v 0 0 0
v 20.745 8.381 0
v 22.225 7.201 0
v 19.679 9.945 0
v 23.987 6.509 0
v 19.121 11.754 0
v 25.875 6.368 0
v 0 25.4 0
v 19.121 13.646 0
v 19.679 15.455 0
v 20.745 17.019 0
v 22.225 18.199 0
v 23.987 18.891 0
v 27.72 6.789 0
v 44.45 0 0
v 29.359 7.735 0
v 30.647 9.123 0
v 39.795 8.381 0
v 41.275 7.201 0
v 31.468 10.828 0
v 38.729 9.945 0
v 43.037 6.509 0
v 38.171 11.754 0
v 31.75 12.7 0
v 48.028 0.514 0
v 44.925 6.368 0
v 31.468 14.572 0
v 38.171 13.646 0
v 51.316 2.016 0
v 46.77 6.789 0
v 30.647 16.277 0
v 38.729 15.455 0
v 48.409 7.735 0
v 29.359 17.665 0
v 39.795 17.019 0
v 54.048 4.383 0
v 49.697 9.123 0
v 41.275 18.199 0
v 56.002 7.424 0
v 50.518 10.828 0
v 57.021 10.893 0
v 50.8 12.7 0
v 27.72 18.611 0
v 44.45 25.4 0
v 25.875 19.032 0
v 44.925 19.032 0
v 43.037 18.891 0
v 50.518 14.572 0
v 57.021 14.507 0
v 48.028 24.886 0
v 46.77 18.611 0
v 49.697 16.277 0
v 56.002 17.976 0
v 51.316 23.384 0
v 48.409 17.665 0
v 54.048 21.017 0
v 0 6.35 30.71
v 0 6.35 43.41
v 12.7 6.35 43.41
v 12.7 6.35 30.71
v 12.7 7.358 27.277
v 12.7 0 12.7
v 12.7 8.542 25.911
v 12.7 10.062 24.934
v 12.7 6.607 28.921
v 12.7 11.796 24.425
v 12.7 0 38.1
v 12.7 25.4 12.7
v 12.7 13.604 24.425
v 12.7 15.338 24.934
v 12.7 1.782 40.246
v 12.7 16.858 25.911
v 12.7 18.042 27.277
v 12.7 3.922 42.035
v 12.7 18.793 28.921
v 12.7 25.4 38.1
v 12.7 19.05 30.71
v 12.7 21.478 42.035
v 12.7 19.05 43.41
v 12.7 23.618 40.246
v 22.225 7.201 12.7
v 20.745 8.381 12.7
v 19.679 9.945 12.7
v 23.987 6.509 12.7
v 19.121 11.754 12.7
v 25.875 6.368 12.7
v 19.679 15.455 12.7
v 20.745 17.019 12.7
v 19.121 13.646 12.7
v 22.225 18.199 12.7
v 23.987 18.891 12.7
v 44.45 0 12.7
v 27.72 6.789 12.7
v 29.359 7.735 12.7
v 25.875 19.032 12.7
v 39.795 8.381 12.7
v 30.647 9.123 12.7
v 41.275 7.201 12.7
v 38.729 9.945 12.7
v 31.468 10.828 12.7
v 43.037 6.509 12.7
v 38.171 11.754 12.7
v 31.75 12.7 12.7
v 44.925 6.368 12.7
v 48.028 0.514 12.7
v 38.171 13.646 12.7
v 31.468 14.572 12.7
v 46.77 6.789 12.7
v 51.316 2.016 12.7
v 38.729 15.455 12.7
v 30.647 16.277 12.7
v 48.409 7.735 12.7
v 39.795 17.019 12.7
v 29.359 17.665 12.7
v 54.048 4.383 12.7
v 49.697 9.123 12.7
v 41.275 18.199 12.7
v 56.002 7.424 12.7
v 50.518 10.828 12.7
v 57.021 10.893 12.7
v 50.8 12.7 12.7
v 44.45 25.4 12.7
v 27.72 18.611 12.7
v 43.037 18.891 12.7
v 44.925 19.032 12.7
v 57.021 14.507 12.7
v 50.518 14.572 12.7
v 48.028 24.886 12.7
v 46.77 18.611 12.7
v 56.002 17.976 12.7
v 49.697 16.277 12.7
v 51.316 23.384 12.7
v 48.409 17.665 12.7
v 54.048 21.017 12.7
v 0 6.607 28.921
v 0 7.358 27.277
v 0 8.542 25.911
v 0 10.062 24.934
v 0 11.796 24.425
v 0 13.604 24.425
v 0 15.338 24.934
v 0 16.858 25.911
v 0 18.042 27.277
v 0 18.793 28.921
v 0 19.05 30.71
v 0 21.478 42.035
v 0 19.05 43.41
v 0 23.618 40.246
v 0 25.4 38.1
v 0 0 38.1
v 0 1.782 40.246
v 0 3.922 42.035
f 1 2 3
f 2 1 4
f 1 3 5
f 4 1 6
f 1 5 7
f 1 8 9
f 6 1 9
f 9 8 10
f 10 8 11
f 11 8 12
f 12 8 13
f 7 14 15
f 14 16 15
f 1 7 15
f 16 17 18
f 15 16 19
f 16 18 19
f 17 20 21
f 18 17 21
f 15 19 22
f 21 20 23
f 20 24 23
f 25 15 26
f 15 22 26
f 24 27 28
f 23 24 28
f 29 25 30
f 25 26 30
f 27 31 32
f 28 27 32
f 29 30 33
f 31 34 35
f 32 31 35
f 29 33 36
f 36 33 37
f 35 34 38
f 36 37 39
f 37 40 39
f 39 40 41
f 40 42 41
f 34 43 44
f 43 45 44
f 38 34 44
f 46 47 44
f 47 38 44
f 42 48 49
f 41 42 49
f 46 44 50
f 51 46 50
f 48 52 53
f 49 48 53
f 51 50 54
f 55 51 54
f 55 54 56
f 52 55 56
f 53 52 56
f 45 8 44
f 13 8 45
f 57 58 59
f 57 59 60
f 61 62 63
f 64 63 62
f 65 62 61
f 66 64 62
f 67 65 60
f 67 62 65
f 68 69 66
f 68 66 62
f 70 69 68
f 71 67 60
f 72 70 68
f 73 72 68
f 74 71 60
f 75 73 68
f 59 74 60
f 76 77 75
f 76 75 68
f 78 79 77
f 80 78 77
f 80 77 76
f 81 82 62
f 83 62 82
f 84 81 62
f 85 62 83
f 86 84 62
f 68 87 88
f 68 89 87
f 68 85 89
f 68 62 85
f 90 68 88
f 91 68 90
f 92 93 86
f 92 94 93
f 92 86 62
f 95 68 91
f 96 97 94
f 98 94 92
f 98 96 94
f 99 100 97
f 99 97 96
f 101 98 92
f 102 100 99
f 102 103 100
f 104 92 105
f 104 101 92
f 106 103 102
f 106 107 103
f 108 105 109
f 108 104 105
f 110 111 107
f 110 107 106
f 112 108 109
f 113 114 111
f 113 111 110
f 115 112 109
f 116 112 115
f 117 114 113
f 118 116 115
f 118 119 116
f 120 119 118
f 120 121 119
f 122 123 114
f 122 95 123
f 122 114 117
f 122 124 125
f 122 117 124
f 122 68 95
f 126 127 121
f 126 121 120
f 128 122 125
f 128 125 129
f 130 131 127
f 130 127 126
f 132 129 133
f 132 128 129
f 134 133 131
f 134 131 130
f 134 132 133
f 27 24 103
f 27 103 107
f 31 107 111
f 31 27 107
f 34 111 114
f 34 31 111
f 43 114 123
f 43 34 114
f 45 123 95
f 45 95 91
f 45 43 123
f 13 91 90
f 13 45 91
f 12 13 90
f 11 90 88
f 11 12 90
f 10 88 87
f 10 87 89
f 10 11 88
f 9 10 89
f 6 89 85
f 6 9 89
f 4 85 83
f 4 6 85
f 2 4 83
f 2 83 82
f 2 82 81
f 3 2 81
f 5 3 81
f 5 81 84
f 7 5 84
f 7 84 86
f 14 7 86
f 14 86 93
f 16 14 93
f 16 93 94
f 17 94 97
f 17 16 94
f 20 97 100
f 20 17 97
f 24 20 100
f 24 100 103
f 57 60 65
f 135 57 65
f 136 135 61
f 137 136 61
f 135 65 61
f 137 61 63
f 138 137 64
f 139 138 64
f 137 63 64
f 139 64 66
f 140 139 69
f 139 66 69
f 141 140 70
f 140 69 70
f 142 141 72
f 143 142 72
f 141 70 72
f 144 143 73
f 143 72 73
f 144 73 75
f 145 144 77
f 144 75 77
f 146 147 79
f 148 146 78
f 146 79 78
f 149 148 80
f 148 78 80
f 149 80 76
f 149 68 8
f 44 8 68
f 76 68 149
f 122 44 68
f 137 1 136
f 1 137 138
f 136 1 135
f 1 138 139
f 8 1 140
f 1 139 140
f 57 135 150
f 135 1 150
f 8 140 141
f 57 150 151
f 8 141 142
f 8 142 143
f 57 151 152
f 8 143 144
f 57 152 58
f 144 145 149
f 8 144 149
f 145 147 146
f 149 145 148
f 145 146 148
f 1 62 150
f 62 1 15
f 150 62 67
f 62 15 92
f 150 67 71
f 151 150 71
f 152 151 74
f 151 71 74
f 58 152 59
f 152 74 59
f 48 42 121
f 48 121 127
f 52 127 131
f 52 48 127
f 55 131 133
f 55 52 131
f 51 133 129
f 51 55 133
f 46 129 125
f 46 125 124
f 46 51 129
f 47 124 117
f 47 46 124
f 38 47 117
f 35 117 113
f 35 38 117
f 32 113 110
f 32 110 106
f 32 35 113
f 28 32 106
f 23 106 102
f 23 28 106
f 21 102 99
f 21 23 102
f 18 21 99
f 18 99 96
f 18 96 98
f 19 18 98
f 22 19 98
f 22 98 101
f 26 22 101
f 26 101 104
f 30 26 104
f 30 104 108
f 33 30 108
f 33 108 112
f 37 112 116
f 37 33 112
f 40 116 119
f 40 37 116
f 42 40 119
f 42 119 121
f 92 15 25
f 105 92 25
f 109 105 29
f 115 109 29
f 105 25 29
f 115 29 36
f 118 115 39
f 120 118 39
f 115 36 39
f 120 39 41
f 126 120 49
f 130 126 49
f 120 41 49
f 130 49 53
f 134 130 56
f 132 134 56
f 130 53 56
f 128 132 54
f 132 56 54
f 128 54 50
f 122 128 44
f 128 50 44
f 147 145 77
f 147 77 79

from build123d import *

# Parameters (mm, degrees)
F0_R     = 6.35
F1_DEPTH = 12.7
F2_W     = 12.7
F2_H     = 25.4
F3_DEPTH = 25.4
F4_W     = 25.4
F4_H     = 6.35
F5_DEPTH = 12.7
F7_DEPTH = 25.4
F9_DEPTH = 25.4


with BuildPart() as f1:
    # F0 (on Top) → F1 (new body)
    with BuildSketch(Plane.XY):
        with BuildLine():
            Line((0, 25.4), (0, 0))
            Line((0, 0), (44.45, 0))
            ThreePointArc((44.45, 0), (57.15, 12.7), (44.45, 25.4))
            Line((44.45, 25.4), (0, 25.4))
        make_face()
        with Locations((25.4, 12.7)):
            Circle(F0_R, mode=Mode.SUBTRACT)
        with Locations((44.45, 12.7)):
            Circle(F0_R, mode=Mode.SUBTRACT)
    extrude(amount=F1_DEPTH)

    # F2 (on face) → F3 (join)
    with BuildSketch(Plane.XZ):
        with Locations((6.35, 25.4)):
            Rectangle(F2_W, F2_H)
    extrude(amount=-F3_DEPTH)

    # F4 (on face) → F5 (join)
    with BuildSketch(Plane.YZ.offset(12.7)):
        with Locations((12.7, 41.275)):
            Rectangle(F4_W, F4_H)
    extrude(amount=-F5_DEPTH)

    # F6 (on face) → F7 (cut)
    with BuildSketch(Plane.YZ.offset(12.7)):
        with BuildLine():
            ThreePointArc((15.8657383942, 44.45), (21.2446497119, 42.1935630666), (25.4, 38.1))
            Line((25.4, 38.1), (25.4, 44.45))
            Line((25.4, 44.45), (15.8657383942, 44.45))
        make_face()
        with BuildLine():
            ThreePointArc((0, 38.1), (4.1553502881, 42.1935630666), (9.5342616058, 44.45))
            Line((9.5342616058, 44.45), (0, 44.45))
            Line((0, 44.45), (0, 38.1))
        make_face()
    extrude(amount=-F7_DEPTH, mode=Mode.SUBTRACT)

    # F8 (on face) → F9 (cut)
    with BuildSketch(Plane.YZ.offset(12.7)):
        with BuildLine():
            ThreePointArc((9.5342616058, 44.45), (7.9137921468, 44.0166926131), (6.35, 43.4098724745))
            Line((6.35, 43.4098724745), (6.35, 30.7098724745))
            ThreePointArc((6.35, 30.7098724745), (12.7, 24.3598724745), (19.05, 30.7098724745))
            Line((19.05, 30.7098724745), (19.05, 43.4098724745))
            ThreePointArc((19.05, 43.4098724745), (17.4862078532, 44.0166926131), (15.8657383942, 44.45))
            Line((15.8657383942, 44.45), (9.5342616058, 44.45))
        make_face()
    extrude(amount=-F9_DEPTH, mode=Mode.SUBTRACT)


solid = f1.part
